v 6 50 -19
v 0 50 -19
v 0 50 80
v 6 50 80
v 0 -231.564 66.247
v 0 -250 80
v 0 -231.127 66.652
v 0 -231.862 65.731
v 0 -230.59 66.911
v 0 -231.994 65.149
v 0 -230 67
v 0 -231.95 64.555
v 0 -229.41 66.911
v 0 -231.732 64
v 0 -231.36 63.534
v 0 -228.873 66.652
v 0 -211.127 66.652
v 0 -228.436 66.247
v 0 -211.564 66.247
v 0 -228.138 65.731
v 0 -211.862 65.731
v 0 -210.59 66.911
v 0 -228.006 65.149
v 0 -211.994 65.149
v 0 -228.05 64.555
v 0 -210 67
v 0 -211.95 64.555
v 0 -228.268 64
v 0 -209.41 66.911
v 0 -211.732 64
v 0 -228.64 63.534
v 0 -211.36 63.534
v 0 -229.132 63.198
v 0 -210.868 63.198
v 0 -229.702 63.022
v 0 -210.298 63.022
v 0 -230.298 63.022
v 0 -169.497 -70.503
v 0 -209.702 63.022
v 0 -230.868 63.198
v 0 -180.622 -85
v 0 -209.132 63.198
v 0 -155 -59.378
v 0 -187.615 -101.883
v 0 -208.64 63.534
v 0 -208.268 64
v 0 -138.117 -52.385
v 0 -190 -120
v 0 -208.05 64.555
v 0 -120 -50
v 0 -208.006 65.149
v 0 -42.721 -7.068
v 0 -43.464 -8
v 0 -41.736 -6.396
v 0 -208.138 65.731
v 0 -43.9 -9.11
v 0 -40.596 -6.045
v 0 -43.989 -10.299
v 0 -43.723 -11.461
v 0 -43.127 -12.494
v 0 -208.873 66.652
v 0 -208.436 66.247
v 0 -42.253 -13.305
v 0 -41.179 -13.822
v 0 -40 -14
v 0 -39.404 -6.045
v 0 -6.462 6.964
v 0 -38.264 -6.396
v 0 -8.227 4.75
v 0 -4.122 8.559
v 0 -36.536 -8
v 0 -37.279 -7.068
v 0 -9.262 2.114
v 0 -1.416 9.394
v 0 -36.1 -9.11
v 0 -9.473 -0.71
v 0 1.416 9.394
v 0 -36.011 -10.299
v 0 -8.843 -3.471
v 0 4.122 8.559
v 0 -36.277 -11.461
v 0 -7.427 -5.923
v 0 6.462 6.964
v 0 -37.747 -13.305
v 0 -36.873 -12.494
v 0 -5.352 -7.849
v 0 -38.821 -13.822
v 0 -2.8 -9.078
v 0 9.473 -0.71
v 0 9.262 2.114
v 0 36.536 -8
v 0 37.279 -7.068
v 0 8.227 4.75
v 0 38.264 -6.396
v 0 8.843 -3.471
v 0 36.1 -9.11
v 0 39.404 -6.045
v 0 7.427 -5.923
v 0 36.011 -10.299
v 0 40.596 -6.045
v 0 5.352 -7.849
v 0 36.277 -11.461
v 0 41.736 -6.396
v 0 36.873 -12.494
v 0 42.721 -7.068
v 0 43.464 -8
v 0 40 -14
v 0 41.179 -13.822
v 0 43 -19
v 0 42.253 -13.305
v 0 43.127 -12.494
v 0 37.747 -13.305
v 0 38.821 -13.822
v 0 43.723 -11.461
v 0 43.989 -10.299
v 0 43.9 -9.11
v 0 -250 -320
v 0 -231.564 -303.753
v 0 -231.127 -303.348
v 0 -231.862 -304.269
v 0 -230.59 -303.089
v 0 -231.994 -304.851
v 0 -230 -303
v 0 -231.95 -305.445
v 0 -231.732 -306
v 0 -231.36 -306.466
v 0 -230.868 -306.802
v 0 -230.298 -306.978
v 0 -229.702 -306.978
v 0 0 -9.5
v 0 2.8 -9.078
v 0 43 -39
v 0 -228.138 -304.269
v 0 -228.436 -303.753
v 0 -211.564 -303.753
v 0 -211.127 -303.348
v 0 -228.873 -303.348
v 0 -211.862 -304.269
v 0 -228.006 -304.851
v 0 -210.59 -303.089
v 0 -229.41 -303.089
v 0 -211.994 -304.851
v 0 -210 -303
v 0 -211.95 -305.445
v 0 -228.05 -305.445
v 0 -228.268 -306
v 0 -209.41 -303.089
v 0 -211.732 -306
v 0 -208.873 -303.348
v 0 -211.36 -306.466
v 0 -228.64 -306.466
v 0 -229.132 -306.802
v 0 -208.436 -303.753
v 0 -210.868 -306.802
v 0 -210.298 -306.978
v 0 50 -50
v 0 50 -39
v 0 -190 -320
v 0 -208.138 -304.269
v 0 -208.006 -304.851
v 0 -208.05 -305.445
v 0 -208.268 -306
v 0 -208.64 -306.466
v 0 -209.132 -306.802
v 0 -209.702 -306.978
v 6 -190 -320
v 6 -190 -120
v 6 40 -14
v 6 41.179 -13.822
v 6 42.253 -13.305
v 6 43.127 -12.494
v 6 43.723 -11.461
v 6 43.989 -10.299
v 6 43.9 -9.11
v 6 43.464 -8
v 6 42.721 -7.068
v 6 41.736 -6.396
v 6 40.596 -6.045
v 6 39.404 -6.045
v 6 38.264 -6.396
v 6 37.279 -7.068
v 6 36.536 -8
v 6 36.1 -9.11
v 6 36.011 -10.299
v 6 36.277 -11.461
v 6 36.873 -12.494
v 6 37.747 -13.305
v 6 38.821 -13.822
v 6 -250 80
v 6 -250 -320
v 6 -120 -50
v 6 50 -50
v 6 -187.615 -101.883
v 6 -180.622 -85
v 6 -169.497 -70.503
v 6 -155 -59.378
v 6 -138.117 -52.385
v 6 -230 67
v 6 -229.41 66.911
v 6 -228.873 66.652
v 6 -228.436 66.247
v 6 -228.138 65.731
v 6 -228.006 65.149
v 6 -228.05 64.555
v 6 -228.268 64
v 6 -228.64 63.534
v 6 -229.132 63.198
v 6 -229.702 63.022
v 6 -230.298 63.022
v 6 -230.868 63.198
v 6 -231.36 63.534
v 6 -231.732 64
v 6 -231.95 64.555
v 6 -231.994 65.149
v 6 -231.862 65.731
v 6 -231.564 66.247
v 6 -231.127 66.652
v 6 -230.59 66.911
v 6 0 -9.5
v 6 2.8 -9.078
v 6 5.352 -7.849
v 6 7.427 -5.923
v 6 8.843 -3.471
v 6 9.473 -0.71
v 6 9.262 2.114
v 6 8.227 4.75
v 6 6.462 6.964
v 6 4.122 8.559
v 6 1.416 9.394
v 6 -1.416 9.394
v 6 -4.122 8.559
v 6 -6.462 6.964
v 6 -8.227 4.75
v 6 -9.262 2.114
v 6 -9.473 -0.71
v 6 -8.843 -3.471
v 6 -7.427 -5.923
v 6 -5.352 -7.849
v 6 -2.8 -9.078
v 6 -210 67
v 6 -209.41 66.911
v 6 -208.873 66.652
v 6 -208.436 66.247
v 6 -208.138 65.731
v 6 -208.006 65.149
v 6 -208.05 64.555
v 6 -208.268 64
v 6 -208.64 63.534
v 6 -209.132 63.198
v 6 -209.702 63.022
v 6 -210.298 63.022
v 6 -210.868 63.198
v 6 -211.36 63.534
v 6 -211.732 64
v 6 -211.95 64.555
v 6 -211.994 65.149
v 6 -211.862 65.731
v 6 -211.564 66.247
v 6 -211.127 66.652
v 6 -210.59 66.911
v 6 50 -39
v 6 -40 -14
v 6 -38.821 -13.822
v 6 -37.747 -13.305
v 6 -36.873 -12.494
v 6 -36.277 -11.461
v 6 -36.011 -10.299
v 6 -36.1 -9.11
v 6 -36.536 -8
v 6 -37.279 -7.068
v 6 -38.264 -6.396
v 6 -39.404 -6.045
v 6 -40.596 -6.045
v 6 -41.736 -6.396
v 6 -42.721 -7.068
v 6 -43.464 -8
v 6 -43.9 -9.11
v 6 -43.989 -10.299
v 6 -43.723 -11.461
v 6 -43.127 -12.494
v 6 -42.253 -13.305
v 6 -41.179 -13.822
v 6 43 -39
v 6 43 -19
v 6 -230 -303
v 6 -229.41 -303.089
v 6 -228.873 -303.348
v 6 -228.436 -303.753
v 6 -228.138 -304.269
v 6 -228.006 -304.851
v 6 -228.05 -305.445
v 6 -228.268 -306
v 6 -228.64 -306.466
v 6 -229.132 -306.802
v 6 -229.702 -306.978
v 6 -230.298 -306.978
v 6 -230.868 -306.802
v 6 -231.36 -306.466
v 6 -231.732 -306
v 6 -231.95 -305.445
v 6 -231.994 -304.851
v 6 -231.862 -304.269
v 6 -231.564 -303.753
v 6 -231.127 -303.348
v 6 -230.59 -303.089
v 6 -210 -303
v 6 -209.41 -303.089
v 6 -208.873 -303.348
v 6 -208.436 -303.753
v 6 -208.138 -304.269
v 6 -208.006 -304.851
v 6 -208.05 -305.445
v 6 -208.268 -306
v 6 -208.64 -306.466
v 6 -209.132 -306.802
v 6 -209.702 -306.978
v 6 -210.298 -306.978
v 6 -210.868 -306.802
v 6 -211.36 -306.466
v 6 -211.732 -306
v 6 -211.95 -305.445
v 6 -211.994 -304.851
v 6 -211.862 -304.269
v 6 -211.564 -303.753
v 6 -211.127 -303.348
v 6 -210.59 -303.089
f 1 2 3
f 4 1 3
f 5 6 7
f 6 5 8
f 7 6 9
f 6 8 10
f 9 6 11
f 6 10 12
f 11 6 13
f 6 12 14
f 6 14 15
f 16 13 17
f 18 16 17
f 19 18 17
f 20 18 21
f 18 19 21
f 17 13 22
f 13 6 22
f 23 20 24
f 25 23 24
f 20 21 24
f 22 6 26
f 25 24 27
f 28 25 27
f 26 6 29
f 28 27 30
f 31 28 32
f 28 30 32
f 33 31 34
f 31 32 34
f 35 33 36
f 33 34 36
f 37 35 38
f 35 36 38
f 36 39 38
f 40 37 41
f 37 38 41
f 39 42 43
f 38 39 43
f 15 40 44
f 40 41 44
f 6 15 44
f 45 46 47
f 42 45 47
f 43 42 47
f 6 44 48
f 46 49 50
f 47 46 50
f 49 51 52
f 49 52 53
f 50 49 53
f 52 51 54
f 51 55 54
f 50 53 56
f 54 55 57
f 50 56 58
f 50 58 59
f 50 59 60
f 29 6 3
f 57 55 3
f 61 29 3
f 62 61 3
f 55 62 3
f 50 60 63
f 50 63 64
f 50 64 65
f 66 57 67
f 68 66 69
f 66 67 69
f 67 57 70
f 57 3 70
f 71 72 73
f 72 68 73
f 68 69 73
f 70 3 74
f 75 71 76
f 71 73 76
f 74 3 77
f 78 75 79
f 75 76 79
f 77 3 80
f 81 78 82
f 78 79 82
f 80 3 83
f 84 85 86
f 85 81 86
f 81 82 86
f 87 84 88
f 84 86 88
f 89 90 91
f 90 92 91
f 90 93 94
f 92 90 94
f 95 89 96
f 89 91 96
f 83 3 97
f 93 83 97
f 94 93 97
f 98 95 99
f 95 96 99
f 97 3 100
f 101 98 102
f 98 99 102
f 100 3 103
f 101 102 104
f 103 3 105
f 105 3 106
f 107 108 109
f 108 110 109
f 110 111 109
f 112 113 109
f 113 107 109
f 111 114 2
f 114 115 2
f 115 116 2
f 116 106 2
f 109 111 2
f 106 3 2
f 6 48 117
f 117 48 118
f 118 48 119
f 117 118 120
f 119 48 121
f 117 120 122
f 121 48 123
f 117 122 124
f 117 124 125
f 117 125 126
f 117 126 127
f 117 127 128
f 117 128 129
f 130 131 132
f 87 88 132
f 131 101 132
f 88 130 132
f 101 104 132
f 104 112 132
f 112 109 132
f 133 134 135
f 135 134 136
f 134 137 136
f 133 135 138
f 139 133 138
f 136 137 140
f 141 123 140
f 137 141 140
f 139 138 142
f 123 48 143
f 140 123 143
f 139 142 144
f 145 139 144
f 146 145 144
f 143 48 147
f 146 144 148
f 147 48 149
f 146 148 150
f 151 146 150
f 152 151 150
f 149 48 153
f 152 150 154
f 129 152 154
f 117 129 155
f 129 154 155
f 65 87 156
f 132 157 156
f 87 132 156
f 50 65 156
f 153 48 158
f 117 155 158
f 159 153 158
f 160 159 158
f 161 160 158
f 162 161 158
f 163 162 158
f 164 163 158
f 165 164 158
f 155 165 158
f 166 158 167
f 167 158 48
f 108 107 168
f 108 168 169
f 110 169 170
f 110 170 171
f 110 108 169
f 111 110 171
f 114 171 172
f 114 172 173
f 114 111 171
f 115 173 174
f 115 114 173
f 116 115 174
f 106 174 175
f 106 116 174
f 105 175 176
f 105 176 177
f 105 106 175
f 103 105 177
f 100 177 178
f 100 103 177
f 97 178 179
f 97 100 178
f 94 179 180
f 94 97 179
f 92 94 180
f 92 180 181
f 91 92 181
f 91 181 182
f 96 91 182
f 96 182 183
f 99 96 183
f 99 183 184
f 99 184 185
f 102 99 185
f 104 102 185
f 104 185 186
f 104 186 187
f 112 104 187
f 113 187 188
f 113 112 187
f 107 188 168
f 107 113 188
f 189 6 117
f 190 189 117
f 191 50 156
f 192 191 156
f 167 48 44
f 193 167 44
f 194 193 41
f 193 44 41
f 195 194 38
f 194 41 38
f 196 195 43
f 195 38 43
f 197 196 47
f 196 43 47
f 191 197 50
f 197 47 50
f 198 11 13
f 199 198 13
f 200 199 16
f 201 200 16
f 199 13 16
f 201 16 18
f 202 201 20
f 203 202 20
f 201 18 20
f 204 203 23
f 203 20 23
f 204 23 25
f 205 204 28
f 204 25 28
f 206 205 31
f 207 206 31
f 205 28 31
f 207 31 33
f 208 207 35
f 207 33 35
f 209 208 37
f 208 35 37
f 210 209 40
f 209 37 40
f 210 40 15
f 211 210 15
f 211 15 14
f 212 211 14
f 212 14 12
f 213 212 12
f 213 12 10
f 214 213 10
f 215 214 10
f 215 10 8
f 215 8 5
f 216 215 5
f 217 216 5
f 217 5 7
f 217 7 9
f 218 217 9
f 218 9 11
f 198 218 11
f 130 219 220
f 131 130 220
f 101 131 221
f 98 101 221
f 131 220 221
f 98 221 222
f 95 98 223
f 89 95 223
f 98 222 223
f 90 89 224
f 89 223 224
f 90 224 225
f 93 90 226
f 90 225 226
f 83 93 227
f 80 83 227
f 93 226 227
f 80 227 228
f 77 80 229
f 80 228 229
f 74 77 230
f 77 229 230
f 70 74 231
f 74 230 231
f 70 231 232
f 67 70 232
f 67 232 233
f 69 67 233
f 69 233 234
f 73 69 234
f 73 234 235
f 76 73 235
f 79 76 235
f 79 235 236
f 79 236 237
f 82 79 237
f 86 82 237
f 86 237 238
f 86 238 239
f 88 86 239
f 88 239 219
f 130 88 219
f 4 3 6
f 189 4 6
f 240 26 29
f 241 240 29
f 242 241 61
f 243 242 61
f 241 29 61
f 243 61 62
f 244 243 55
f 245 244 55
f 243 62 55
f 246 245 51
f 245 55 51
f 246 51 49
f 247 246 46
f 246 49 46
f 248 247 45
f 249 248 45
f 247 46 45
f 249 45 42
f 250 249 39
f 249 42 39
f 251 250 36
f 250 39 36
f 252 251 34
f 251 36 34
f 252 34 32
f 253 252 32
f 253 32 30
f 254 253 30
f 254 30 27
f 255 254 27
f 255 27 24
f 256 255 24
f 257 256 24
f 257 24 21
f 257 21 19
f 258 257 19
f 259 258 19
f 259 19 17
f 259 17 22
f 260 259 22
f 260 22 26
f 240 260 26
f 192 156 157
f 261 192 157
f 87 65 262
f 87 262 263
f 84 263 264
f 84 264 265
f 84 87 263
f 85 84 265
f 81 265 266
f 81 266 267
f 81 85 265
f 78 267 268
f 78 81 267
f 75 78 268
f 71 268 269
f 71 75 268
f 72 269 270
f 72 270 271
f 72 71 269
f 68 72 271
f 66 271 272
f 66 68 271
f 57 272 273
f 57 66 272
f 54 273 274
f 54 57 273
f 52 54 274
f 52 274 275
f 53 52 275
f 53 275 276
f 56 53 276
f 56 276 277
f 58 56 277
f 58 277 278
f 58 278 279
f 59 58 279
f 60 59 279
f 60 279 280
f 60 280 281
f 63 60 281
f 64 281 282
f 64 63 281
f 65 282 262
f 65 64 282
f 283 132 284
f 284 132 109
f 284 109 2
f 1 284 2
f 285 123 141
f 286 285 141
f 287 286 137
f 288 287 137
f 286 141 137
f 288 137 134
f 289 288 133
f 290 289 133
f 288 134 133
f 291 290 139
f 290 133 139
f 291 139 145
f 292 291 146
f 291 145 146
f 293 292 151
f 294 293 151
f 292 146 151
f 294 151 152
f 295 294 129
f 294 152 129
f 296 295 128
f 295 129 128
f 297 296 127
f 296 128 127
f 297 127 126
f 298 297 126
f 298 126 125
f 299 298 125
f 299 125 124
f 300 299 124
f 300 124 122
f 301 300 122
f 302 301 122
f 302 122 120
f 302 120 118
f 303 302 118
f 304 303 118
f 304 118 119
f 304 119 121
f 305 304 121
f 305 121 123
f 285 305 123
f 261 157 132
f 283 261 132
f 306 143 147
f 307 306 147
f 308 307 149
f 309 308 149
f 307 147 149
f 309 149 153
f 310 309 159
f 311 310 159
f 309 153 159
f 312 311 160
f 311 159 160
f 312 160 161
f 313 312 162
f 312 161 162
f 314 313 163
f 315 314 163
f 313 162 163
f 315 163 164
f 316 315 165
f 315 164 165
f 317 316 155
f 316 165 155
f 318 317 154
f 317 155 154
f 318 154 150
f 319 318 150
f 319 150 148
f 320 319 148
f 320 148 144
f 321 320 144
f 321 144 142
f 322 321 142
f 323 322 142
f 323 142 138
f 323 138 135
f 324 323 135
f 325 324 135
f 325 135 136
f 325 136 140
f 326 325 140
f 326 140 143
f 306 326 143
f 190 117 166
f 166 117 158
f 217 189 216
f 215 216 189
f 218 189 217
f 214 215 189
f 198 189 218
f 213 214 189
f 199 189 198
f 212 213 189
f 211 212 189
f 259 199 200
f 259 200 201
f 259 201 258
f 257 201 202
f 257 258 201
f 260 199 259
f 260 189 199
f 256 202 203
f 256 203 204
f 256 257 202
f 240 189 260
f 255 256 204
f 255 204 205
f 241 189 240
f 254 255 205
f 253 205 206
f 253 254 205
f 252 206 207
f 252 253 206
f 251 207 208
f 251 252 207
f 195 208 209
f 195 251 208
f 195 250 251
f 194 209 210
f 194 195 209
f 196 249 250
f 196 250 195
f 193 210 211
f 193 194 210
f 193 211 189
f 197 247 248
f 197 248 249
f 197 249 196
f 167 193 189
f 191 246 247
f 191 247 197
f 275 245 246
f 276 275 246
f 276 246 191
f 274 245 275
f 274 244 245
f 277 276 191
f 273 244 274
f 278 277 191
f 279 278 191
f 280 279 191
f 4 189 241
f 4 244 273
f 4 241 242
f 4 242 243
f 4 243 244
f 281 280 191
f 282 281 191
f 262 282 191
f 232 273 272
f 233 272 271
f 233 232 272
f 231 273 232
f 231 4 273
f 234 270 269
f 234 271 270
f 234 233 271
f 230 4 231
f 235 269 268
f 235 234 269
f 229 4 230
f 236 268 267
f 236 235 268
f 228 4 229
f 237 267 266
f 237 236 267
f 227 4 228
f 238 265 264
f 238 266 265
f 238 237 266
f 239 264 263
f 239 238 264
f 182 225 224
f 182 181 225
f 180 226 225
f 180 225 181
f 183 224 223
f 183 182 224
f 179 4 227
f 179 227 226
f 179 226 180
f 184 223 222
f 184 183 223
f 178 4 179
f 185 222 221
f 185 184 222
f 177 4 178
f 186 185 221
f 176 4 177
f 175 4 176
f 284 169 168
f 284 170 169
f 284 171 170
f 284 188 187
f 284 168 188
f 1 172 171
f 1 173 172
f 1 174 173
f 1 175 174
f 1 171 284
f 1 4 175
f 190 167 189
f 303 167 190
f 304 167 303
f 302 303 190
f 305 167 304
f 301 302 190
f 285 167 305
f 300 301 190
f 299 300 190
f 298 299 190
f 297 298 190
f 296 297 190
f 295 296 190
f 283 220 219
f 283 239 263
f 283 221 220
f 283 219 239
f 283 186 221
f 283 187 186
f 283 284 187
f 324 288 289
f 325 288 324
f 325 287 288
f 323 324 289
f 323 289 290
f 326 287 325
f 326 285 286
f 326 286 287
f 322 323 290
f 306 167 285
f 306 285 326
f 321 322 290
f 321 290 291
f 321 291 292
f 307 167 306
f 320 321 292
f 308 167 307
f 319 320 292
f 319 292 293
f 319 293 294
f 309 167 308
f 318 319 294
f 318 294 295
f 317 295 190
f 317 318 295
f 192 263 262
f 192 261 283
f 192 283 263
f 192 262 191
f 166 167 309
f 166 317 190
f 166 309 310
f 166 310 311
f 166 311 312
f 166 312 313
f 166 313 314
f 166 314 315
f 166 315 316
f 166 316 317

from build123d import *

# Parameters (mm, degrees)
SKETCH1_R           = 4
BOSS_EXTRUDE1_DEPTH = 6
CUT_EXTRUDE1_REACH  = 8
SKETCH3_R           = 9.5
SKETCH4_W           = 50
SKETCH4_H           = 300
BOSS_EXTRUDE2_DEPTH = 6
CUT_EXTRUDE2_REACH  = 8
SKETCH5_R           = 2


with BuildPart() as part:
    # Sketch1 → Boss-Extrude1 (new body)
    with BuildSketch(Plane(origin=(0, 0, 0), x_dir=(0, 0, -1), z_dir=(1, 0, 0))):
        with BuildLine():
            Line((-80, -190), (-80, -250))
            Line((-80, -250), (320, -250))
            Line((320, -250), (320, -190))
            Line((320, -190), (120, -190))
            ThreePointArc((120, -190), (70.502525317, -169.497474683), (50, -120))
            Line((50, -120), (50, 50))
            Line((50, 50), (39, 50))
            Line((39, 50), (39, 43))
            Line((39, 43), (19, 43))
            Line((19, 43), (19, 50))
            Line((19, 50), (-30, 50))
            Line((-30, 50), (-30, -120.049643139))
            ThreePointArc((-30, -120.049643139), (-43.785205981, -163.041073753), (-80, -190))
        make_face()
        with Locations((10, -40)):
            Circle(SKETCH1_R, mode=Mode.SUBTRACT)
        Circle(SKETCH1_R, mode=Mode.SUBTRACT)
        with Locations((10, 40)):
            Circle(SKETCH1_R, mode=Mode.SUBTRACT)
    extrude(amount=BOSS_EXTRUDE1_DEPTH)

    # Sketch3 → Cut-Extrude1 (cut, up to next)
    with BuildSketch(Plane(origin=(6, 0, 0), x_dir=(0, 0, -1), z_dir=(1, 0, 0)), mode=Mode.PRIVATE) as cut_extrude1_sk1:
        Circle(SKETCH3_R)
    cut_extrude1_tool1 = extrude(cut_extrude1_sk1.sketch, amount=-CUT_EXTRUDE1_REACH, mode=Mode.PRIVATE) & part.part
    add(cut_extrude1_tool1.solids().sort_by_distance((6, 0, 0))[0], mode=Mode.SUBTRACT)

    # Sketch4 → Boss-Extrude2 (add)
    with BuildSketch(Plane.ZY):
        with Locations((55, -100)):
            Rectangle(SKETCH4_W, SKETCH4_H)
    extrude(amount=-BOSS_EXTRUDE2_DEPTH)

    # Sketch5 → Cut-Extrude2 (cut, up to next)
    with BuildSketch(Plane.ZY, mode=Mode.PRIVATE) as cut_extrude2_sk1:
        with Locations((65, -210)):
            Circle(SKETCH5_R)
    cut_extrude2_tool1 = extrude(cut_extrude2_sk1.sketch, amount=-CUT_EXTRUDE2_REACH, mode=Mode.PRIVATE) & part.part
    add(cut_extrude2_tool1.solids().sort_by_distance((0, -210, 65))[0], mode=Mode.SUBTRACT)
    # Sketch5 → Cut-Extrude2 (cut, up to next)
    with BuildSketch(Plane.ZY, mode=Mode.PRIVATE) as cut_extrude2_sk2:
        with Locations((65, -230)):
            Circle(SKETCH5_R)
    cut_extrude2_tool2 = extrude(cut_extrude2_sk2.sketch, amount=-CUT_EXTRUDE2_REACH, mode=Mode.PRIVATE) & part.part
    add(cut_extrude2_tool2.solids().sort_by_distance((0, -230, 65))[0], mode=Mode.SUBTRACT)
    # Sketch5 → Cut-Extrude2 (cut, up to next)
    with BuildSketch(Plane.ZY, mode=Mode.PRIVATE) as cut_extrude2_sk3:
        with Locations((-305, -230)):
            Circle(SKETCH5_R)
    cut_extrude2_tool3 = extrude(cut_extrude2_sk3.sketch, amount=-CUT_EXTRUDE2_REACH, mode=Mode.PRIVATE) & part.part
    add(cut_extrude2_tool3.solids().sort_by_distance((0, -230, -305))[0], mode=Mode.SUBTRACT)
    # Sketch5 → Cut-Extrude2 (cut, up to next)
    with BuildSketch(Plane.ZY, mode=Mode.PRIVATE) as cut_extrude2_sk4:
        with Locations((-305, -210)):
            Circle(SKETCH5_R)
    cut_extrude2_tool4 = extrude(cut_extrude2_sk4.sketch, amount=-CUT_EXTRUDE2_REACH, mode=Mode.PRIVATE) & part.part
    add(cut_extrude2_tool4.solids().sort_by_distance((0, -210, -305))[0], mode=Mode.SUBTRACT)


solid = part.part
